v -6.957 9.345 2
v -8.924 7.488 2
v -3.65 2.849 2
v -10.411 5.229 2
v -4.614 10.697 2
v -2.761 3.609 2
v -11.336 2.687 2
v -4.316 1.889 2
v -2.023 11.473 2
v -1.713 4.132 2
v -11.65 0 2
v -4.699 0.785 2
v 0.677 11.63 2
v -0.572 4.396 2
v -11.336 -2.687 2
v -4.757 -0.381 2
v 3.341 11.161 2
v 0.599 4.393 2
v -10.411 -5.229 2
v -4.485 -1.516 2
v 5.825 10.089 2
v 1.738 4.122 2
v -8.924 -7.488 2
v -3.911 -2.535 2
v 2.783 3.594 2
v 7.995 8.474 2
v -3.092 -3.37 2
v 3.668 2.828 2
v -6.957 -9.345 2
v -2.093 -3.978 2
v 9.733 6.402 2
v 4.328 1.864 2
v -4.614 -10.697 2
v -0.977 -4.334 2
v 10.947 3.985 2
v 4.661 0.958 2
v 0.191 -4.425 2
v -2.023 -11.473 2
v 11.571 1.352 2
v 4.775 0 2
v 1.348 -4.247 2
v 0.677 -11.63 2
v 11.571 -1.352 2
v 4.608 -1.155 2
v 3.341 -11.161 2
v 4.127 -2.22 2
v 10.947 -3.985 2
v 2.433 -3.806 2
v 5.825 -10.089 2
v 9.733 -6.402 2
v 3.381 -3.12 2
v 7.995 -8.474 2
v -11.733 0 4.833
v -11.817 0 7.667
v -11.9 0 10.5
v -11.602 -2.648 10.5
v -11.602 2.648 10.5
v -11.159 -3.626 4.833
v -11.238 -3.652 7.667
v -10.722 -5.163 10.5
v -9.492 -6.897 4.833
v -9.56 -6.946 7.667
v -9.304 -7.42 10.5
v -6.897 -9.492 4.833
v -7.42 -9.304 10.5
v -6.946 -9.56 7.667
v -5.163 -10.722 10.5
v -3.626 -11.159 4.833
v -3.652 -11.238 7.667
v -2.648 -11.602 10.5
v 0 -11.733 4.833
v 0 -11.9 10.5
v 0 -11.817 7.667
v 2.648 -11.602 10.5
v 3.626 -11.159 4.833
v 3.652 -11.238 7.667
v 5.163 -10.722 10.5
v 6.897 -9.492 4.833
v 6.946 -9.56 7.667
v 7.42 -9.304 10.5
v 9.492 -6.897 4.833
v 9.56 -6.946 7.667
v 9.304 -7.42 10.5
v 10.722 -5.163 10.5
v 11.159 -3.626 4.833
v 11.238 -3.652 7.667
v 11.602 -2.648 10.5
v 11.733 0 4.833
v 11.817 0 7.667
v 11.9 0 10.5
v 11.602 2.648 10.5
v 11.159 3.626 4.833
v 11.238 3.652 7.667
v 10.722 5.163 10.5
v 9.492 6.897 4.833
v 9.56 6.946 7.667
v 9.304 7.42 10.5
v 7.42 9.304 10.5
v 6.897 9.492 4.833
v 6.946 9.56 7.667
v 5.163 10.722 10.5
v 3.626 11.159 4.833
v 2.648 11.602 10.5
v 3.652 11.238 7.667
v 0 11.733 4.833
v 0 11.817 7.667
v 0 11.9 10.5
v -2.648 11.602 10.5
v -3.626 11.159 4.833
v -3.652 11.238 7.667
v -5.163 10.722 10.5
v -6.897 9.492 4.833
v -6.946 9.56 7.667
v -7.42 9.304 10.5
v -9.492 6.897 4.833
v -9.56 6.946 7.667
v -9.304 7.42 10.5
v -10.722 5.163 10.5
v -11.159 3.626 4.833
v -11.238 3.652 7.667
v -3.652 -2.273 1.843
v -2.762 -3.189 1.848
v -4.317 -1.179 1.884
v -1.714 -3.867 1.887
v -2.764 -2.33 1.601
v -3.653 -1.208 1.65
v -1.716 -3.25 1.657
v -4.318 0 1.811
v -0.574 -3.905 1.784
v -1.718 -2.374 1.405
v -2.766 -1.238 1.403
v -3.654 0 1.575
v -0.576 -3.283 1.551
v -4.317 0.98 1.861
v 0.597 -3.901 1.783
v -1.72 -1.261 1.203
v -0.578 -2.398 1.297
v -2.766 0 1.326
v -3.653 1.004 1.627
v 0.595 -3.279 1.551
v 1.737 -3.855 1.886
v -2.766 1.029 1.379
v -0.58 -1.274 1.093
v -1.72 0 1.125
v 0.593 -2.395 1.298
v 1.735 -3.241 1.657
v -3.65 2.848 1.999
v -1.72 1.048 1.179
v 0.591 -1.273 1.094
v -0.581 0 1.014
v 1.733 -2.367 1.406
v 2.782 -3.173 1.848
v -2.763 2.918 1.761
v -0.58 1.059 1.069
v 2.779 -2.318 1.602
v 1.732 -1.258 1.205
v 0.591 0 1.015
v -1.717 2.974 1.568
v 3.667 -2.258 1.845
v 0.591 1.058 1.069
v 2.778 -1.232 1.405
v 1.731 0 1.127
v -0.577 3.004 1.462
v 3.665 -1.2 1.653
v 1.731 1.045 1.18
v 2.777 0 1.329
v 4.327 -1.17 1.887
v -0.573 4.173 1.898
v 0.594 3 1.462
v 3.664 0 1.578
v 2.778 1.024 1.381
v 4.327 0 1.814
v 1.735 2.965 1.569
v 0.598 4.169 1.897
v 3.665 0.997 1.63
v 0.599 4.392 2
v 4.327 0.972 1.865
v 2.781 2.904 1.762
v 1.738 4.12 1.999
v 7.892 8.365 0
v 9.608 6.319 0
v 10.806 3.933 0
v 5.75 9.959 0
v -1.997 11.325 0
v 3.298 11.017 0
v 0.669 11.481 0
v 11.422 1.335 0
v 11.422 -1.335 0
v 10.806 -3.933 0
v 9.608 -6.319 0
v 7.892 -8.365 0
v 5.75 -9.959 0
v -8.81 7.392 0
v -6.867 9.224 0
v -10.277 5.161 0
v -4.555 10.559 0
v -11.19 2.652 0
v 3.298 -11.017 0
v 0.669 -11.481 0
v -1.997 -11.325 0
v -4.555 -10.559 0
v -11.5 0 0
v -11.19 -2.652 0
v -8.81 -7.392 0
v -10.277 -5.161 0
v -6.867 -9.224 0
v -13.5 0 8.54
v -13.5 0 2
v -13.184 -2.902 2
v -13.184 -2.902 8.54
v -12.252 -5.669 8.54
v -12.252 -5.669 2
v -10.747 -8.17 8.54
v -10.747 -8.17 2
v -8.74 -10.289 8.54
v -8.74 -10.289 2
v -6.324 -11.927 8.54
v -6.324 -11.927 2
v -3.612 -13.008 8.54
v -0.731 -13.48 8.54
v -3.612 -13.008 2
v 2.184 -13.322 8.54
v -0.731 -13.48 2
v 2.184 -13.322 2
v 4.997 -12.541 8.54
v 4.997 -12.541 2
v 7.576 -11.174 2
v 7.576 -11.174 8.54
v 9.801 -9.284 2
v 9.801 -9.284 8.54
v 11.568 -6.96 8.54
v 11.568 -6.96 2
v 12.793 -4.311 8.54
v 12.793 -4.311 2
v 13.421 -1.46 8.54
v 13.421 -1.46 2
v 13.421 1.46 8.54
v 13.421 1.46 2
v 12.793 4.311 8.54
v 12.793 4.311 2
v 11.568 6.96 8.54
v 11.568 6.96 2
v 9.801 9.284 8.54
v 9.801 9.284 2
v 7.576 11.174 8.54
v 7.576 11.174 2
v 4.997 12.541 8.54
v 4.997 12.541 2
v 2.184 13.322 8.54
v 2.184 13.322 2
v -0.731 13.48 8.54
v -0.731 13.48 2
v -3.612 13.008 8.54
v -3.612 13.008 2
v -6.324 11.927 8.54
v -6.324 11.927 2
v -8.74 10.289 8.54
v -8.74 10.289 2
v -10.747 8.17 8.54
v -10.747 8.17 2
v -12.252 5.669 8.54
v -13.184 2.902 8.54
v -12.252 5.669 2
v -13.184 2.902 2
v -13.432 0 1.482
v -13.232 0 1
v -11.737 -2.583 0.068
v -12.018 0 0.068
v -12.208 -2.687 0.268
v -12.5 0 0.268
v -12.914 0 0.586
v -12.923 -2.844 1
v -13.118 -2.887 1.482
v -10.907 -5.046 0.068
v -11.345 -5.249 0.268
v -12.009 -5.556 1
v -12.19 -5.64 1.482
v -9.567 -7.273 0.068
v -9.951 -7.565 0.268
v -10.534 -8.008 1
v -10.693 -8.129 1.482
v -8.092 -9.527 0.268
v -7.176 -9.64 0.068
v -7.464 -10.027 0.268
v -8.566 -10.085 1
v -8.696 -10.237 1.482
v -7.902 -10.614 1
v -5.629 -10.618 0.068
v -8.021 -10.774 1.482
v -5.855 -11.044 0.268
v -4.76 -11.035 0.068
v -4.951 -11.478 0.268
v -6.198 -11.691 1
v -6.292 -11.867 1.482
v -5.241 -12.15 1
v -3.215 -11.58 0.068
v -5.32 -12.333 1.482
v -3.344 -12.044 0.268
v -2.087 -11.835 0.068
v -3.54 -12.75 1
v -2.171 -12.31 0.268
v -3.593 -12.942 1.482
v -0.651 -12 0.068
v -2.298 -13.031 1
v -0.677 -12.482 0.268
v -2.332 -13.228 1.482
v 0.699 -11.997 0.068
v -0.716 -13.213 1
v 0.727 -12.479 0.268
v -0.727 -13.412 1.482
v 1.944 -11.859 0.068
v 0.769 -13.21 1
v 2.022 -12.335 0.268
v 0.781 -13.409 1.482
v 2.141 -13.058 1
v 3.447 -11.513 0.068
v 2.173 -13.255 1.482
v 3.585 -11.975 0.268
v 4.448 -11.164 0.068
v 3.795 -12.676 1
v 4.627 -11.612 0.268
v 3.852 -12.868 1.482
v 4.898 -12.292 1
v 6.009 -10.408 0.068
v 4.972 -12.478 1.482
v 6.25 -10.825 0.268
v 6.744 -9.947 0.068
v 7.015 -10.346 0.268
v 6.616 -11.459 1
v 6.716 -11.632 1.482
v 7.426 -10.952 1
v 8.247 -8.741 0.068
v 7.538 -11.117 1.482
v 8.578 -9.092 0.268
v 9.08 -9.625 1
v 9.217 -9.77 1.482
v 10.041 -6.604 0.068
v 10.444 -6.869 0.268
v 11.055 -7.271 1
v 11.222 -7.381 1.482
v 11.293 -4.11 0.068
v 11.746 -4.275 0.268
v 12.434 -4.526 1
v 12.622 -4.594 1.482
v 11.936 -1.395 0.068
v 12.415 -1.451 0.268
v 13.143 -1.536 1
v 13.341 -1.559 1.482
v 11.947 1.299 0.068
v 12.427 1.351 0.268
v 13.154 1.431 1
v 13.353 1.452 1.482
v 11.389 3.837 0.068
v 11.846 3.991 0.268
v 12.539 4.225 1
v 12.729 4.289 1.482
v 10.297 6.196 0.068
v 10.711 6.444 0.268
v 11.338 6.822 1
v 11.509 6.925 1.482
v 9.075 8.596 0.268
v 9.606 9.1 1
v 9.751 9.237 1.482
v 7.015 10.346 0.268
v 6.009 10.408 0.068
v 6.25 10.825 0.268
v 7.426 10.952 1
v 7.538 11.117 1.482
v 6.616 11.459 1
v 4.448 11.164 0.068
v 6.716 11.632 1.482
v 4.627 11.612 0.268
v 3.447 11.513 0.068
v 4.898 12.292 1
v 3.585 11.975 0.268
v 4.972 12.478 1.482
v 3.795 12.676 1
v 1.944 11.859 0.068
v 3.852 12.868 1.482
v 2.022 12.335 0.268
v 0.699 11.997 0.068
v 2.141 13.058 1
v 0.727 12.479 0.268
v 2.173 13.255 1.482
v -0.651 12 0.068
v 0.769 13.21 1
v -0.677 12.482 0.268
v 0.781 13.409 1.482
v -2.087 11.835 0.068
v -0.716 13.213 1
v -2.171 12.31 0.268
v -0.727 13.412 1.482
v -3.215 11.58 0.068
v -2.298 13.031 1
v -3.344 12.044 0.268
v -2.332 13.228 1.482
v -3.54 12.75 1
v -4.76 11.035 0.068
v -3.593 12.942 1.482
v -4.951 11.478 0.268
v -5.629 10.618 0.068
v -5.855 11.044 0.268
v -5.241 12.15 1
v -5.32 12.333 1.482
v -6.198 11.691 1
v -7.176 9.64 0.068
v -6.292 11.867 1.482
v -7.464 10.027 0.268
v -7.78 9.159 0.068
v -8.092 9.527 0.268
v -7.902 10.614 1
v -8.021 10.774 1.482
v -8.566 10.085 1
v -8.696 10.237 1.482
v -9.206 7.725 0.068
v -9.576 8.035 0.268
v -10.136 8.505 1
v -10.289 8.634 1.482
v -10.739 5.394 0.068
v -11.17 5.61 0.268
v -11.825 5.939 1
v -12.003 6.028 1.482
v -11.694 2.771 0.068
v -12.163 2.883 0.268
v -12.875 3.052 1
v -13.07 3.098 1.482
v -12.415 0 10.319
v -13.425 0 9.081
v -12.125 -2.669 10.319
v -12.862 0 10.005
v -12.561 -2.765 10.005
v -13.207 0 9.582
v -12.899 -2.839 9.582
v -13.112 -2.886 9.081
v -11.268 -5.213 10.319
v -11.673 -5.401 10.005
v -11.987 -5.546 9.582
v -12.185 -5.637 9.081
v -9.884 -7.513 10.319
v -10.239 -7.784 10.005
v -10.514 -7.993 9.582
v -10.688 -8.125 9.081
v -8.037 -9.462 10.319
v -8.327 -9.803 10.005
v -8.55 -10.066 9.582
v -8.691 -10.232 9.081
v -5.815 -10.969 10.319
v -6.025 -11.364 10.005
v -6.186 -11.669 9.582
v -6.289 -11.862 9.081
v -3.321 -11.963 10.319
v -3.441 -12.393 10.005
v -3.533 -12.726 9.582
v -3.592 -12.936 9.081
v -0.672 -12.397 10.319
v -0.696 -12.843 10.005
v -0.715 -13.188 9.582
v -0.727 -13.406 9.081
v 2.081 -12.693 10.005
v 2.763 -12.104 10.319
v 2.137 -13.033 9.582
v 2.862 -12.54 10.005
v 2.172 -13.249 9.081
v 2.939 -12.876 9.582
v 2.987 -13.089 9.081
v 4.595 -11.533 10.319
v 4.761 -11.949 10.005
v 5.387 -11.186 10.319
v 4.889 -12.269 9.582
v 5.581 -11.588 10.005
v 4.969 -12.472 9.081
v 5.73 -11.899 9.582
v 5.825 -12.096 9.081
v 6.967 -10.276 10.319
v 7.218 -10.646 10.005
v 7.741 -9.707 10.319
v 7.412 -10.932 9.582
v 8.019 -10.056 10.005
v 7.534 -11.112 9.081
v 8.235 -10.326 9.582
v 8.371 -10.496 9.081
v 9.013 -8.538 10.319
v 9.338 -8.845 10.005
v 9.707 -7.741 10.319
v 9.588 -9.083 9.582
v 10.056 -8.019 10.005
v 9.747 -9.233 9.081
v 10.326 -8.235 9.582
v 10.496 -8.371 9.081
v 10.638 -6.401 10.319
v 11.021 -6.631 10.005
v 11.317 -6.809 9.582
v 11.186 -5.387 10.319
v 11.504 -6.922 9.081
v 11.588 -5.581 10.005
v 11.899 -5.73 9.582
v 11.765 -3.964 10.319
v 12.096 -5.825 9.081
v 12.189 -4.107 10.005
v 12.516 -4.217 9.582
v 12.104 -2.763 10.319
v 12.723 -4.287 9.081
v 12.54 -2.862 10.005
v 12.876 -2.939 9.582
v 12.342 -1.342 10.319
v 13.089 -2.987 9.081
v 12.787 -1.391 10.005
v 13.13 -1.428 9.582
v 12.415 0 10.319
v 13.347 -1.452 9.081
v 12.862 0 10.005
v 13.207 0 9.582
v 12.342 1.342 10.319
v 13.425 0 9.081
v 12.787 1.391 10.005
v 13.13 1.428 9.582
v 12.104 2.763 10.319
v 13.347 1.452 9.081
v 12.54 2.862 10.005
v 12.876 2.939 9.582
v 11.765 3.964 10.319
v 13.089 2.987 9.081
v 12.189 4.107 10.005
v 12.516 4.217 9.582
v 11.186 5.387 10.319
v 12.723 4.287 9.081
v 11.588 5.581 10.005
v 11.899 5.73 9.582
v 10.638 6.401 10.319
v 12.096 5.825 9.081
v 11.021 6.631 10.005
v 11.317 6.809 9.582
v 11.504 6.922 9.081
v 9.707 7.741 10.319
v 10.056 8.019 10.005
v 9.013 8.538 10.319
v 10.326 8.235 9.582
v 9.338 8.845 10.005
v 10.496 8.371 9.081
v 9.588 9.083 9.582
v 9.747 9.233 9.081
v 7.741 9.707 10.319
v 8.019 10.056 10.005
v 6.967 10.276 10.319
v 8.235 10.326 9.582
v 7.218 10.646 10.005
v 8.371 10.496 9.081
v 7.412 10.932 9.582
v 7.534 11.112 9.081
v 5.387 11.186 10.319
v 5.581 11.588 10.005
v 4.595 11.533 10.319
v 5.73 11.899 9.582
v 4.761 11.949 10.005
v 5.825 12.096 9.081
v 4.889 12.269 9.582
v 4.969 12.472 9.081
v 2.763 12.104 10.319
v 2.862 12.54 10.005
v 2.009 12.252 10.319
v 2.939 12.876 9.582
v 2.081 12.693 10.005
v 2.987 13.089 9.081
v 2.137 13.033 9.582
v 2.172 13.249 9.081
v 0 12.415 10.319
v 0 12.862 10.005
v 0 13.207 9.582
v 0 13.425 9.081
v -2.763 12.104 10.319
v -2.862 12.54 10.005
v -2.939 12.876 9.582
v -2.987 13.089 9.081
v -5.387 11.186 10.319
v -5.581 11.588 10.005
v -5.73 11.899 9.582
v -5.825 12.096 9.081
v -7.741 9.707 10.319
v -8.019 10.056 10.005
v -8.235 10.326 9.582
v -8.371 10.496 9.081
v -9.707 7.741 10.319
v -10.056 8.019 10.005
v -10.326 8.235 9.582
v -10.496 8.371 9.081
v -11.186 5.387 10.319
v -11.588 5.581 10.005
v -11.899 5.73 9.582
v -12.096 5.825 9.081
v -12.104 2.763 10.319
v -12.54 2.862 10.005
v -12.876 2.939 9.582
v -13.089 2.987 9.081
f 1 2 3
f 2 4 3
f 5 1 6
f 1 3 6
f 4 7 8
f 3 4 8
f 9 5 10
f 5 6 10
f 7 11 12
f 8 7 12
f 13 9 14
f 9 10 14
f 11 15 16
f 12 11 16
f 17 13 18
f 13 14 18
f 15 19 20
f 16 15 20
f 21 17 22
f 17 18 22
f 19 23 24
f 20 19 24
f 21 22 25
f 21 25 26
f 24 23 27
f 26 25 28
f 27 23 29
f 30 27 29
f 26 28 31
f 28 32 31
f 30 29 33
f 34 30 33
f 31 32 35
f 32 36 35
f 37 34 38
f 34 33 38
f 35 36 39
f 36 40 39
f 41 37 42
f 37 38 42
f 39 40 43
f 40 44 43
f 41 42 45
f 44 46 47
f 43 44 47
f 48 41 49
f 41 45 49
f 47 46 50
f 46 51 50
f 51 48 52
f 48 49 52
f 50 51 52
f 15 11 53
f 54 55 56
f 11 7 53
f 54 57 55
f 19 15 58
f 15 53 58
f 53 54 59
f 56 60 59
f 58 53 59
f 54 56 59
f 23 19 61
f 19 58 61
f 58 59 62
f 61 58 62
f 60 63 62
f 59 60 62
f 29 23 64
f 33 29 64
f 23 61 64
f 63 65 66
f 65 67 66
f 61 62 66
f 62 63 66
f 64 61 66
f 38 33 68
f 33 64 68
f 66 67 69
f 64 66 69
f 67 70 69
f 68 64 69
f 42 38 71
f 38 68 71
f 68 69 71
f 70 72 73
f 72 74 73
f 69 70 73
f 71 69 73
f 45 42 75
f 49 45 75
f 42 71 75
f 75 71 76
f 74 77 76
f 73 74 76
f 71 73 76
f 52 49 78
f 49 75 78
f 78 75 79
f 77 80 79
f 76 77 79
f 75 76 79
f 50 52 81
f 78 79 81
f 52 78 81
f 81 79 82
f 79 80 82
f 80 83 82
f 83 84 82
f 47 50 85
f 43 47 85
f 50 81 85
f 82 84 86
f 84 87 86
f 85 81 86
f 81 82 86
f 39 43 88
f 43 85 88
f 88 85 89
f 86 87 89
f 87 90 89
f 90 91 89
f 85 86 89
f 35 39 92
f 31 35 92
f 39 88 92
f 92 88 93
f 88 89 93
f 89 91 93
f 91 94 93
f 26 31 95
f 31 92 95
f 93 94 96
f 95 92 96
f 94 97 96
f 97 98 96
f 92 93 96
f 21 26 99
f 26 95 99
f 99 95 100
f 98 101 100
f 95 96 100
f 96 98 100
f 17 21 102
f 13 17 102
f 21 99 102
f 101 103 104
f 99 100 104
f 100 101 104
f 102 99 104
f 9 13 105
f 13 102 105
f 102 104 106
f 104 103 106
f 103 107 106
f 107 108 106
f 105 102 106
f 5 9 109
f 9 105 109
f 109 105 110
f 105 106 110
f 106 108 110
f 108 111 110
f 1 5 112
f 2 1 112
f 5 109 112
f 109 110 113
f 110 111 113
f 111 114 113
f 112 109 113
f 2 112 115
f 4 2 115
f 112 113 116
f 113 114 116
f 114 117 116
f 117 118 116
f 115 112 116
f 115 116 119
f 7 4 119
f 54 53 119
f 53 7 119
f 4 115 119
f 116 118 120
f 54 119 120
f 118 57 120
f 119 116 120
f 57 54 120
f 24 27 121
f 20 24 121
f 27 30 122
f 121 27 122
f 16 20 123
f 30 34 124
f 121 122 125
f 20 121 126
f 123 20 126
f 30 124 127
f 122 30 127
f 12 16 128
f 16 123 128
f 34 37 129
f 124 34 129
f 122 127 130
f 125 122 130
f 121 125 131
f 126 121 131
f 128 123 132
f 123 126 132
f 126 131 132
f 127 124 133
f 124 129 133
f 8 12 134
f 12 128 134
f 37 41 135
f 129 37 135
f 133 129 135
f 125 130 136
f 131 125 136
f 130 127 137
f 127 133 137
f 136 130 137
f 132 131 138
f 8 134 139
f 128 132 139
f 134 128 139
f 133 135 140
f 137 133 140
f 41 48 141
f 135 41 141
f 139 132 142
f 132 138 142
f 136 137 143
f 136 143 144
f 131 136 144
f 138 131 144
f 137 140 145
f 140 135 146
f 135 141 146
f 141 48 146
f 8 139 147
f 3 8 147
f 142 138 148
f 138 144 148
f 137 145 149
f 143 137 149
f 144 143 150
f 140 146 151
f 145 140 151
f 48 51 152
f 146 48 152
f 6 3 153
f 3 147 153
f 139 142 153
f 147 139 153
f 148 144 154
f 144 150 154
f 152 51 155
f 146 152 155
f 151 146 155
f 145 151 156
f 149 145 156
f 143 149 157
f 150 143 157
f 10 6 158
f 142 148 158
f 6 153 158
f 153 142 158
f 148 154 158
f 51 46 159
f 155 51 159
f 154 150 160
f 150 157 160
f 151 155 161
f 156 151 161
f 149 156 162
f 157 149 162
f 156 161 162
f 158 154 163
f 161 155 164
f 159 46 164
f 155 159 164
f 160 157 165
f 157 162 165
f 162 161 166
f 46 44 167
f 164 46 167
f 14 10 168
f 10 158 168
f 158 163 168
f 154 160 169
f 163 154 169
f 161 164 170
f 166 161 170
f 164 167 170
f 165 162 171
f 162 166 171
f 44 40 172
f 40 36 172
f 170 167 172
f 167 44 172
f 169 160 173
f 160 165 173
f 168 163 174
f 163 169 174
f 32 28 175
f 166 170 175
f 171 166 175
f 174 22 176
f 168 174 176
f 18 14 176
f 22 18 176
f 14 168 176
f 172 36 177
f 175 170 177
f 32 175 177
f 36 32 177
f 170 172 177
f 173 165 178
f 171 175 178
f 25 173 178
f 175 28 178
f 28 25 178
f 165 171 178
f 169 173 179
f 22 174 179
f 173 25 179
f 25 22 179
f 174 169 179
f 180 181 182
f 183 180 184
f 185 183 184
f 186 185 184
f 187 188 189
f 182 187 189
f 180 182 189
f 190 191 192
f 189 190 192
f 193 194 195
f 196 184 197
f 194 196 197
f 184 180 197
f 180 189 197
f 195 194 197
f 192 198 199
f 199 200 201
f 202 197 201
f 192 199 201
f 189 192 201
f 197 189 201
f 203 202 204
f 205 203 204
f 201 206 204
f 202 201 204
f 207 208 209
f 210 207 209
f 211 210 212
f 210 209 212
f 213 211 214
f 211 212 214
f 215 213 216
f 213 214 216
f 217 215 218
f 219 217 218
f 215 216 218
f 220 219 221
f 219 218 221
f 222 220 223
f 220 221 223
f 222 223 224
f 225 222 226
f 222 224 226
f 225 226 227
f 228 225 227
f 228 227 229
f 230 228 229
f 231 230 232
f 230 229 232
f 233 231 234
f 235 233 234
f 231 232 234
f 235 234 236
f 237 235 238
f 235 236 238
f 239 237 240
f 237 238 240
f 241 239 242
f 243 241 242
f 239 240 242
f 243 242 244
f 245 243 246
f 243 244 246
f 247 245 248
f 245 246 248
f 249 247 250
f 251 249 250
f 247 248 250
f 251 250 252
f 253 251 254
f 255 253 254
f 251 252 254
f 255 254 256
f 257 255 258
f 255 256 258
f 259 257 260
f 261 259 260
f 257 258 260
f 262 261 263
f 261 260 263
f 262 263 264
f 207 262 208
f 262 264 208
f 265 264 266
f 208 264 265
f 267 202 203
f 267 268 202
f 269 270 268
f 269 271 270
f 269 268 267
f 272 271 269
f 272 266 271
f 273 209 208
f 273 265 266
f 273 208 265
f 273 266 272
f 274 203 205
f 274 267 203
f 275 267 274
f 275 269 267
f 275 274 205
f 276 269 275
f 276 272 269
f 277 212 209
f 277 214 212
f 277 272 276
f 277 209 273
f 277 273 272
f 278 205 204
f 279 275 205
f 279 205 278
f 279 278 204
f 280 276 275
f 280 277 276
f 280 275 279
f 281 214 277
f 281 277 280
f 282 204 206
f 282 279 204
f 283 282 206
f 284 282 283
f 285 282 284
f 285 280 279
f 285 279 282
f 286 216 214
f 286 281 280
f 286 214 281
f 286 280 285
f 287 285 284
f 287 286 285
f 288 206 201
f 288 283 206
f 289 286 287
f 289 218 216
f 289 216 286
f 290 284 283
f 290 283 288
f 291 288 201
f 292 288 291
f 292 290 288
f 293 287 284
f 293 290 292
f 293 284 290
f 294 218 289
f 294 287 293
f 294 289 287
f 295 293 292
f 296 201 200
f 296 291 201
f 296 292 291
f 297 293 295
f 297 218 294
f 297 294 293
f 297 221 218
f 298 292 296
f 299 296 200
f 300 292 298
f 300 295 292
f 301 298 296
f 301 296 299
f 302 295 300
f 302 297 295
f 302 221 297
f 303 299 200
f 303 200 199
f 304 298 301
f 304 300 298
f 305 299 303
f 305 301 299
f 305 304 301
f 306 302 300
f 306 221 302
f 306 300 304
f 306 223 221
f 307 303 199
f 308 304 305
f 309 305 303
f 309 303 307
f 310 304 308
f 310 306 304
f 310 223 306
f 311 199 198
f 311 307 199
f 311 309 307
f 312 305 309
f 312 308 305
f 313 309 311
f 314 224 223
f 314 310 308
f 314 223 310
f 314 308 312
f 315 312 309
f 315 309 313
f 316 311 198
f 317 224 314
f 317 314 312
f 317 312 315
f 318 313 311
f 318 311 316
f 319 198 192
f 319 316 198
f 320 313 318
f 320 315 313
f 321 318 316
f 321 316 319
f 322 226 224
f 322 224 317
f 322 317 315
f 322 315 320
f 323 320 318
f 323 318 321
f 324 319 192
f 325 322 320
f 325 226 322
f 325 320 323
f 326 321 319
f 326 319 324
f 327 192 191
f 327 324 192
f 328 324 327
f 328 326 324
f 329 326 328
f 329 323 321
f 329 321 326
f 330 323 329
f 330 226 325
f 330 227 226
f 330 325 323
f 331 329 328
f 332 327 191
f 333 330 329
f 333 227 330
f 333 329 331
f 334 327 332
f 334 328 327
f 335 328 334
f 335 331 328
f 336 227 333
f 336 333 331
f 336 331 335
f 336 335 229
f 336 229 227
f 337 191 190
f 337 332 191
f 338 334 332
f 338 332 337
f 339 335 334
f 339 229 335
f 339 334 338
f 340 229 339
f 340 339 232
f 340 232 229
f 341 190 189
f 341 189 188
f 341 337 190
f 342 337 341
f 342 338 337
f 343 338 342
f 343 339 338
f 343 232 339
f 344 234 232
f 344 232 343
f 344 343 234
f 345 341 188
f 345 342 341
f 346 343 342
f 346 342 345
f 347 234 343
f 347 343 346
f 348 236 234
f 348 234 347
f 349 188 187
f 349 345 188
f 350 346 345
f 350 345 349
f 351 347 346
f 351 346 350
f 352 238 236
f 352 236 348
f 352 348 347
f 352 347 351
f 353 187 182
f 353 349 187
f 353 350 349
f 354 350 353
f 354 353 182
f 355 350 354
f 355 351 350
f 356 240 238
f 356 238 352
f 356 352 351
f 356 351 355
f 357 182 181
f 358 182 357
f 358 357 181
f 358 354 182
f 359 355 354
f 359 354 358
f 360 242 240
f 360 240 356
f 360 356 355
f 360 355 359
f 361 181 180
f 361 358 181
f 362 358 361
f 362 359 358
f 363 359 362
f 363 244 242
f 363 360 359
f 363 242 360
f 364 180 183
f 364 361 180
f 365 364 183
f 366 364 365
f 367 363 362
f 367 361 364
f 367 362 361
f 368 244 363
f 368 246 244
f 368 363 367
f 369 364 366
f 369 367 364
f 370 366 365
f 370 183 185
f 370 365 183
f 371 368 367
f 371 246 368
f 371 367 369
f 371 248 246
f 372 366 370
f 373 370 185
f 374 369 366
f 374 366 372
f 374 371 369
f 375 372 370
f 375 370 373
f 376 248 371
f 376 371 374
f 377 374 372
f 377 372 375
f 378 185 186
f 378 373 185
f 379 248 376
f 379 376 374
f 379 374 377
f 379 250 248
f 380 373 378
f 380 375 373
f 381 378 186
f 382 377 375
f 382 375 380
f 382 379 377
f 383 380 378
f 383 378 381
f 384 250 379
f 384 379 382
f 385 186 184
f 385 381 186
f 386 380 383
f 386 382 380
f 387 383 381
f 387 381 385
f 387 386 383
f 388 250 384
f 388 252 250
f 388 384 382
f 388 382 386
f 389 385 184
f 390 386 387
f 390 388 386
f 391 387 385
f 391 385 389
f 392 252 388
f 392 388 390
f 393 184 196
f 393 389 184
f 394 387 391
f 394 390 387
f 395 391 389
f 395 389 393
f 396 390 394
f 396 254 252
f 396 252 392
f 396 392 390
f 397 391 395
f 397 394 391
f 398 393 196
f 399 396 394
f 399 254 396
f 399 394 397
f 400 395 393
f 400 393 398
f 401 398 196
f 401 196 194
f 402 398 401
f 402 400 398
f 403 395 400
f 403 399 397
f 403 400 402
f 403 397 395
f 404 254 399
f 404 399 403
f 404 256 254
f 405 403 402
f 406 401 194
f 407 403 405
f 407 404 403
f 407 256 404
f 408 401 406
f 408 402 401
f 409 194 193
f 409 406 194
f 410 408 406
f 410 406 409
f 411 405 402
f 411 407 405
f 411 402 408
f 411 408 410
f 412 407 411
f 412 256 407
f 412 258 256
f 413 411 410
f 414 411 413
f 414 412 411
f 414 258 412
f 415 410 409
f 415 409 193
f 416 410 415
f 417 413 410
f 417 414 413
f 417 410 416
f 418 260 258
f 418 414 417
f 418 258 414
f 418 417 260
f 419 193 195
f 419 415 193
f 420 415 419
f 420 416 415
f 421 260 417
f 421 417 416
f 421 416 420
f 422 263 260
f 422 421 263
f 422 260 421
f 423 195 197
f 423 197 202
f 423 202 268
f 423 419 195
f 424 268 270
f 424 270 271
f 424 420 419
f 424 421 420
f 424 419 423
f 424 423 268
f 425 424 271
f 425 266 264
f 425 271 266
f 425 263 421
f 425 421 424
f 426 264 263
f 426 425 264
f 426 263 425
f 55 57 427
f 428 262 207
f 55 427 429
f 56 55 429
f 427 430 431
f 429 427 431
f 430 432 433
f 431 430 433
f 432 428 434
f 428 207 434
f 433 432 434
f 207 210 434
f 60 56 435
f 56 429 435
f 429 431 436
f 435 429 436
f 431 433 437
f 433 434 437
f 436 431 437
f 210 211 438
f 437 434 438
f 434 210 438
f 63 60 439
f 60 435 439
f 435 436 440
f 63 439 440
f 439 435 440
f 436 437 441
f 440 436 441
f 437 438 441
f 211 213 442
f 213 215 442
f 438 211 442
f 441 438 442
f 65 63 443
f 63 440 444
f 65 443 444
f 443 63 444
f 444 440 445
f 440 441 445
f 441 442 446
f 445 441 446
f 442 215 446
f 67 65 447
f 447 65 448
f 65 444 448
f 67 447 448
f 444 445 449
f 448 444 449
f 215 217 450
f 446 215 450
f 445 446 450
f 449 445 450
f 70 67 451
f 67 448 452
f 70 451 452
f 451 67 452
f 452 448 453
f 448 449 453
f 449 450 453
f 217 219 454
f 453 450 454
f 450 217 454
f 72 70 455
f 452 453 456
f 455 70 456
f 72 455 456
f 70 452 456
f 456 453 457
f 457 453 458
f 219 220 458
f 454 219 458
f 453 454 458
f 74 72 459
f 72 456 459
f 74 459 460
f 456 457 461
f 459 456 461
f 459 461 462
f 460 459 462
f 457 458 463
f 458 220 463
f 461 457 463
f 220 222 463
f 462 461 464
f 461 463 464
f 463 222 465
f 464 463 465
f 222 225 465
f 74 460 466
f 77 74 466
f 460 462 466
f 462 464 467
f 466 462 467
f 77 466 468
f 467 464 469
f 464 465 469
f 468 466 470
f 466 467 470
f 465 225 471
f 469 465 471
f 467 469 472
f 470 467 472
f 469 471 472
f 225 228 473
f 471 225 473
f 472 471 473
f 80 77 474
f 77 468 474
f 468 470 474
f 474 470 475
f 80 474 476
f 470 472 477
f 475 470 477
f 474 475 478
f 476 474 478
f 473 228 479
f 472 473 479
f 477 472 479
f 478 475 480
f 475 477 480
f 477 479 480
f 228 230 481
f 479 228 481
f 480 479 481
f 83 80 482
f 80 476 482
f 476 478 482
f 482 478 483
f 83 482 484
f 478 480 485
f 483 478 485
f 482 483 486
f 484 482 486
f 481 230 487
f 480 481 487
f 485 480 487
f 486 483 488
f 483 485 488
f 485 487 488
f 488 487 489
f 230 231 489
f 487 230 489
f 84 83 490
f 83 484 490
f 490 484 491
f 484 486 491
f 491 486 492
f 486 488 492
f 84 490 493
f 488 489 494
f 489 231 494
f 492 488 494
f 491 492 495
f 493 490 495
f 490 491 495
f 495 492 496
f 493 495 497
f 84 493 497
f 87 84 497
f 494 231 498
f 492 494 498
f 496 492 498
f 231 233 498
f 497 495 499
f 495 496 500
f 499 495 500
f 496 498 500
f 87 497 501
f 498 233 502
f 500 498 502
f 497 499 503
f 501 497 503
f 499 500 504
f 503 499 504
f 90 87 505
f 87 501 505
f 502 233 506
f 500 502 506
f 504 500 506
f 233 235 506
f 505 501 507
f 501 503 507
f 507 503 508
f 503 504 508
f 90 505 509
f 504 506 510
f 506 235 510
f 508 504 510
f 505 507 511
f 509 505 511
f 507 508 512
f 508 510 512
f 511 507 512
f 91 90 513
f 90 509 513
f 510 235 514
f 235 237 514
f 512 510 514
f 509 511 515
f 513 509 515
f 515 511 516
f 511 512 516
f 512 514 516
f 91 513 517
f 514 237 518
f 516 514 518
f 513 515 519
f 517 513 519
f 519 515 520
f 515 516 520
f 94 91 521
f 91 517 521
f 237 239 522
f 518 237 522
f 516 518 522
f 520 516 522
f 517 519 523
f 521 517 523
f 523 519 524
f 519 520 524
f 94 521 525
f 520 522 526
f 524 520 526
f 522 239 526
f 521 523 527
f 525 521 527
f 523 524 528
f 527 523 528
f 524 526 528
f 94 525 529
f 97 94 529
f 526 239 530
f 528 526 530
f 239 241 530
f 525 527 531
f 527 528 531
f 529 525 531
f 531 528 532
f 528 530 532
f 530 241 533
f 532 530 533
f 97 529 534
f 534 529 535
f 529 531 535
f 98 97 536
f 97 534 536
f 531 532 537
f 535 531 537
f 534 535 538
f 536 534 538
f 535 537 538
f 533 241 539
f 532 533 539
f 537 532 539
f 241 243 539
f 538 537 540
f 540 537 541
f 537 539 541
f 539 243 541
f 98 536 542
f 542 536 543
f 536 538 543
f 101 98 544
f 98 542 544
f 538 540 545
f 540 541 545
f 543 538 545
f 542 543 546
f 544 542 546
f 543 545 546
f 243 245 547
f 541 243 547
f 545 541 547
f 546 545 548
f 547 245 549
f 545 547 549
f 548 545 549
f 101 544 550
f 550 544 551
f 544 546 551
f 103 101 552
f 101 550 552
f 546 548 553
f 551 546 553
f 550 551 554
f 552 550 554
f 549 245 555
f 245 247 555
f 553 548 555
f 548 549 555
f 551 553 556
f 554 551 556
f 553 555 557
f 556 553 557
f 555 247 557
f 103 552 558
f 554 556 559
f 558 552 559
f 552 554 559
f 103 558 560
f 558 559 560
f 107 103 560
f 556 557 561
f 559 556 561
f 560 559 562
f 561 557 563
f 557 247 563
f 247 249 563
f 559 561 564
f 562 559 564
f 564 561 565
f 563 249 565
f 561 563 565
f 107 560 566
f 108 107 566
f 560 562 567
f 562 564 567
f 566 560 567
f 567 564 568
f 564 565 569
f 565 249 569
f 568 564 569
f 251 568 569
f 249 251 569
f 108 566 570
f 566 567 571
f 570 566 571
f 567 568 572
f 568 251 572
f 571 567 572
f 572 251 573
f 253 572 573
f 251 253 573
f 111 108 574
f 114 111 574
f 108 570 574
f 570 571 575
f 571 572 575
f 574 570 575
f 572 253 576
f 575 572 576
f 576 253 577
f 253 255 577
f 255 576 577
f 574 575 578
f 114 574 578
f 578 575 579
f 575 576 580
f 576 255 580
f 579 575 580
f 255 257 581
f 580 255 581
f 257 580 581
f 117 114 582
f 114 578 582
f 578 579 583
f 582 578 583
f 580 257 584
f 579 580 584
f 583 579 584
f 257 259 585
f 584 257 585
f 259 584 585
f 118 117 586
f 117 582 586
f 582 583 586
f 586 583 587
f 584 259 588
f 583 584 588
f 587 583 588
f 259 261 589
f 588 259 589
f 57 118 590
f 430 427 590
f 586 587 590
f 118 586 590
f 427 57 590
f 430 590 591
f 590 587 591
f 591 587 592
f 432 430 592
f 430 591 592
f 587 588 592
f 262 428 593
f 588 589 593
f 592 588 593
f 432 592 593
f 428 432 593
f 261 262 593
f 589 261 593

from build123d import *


# Not quite as in the source:
# - a fillet or chamfer that OpenCascade refuses, or shapes differently, is made with other operations: its cross-section is extruded or revolved along the edge and cut away or added


with BuildPart() as f1:
    # F0 (on Front) → F1 (revolve)
    with BuildSketch(Plane.XZ):
        Polygon((-13.5, 0), (0, 0), (0, 2), (-11.65, 2), (-13.5, 2), align=None)
        Polygon((-13.5, 10.5), (-13.5, 2), (-11.65, 2), (-11.9, 10.5), align=None)
    revolve(axis=Axis((0, 0, 1), (0, 0, 1)))

    # F2: fillet of radius 2 on 2 edges, made by hand

    # F2_s1 → F2_t2 (revolve, cut)
    with BuildSketch(Plane.XZ):
        with BuildLine():
            ThreePointArc((-11.9, 10.5), (-13.0491933385, 9.8053192698), (-13.5, 8.5404082058))
            Line((-13.5, 8.5404082058), (-13.5, 10.5))
            Line((-13.5, 10.5), (-11.9, 10.5))
        make_face()
    revolve(axis=Axis((0, 0, 10.5), (0, 0, 1)), mode=Mode.SUBTRACT)

    # F2_s3 → F2_t4 (revolve, cut)
    with BuildSketch(Plane.XZ):
        with BuildLine():
            ThreePointArc((-11.5, 0), (-12.9142135624, 0.5857864376), (-13.5, 2))
            Line((-13.5, 2), (-13.5, 0))
            Line((-13.5, 0), (-11.5, 0))
        make_face()
    revolve(axis=Axis((0, 0, 0), (0, 0, 1)), mode=Mode.SUBTRACT)

    # F3 (on Front) → F4 (revolve, cut)
    with BuildSketch(Plane.XZ):
        with BuildLine():
            Line((11.7787091929, 11.2052995105), (-11.8056663253, 11.404592826))
            ThreePointArc((-11.8056663253, 11.404592826), (-0.1005541056, 1.0004248449), (11.7787091929, 11.2052995105))
        make_face()
    revolve(axis=Axis((-0.0134785662, 0, 11.3049461682), (0.9999642987, 0, -0.0084499248)), mode=Mode.SUBTRACT)


solid = f1.part
